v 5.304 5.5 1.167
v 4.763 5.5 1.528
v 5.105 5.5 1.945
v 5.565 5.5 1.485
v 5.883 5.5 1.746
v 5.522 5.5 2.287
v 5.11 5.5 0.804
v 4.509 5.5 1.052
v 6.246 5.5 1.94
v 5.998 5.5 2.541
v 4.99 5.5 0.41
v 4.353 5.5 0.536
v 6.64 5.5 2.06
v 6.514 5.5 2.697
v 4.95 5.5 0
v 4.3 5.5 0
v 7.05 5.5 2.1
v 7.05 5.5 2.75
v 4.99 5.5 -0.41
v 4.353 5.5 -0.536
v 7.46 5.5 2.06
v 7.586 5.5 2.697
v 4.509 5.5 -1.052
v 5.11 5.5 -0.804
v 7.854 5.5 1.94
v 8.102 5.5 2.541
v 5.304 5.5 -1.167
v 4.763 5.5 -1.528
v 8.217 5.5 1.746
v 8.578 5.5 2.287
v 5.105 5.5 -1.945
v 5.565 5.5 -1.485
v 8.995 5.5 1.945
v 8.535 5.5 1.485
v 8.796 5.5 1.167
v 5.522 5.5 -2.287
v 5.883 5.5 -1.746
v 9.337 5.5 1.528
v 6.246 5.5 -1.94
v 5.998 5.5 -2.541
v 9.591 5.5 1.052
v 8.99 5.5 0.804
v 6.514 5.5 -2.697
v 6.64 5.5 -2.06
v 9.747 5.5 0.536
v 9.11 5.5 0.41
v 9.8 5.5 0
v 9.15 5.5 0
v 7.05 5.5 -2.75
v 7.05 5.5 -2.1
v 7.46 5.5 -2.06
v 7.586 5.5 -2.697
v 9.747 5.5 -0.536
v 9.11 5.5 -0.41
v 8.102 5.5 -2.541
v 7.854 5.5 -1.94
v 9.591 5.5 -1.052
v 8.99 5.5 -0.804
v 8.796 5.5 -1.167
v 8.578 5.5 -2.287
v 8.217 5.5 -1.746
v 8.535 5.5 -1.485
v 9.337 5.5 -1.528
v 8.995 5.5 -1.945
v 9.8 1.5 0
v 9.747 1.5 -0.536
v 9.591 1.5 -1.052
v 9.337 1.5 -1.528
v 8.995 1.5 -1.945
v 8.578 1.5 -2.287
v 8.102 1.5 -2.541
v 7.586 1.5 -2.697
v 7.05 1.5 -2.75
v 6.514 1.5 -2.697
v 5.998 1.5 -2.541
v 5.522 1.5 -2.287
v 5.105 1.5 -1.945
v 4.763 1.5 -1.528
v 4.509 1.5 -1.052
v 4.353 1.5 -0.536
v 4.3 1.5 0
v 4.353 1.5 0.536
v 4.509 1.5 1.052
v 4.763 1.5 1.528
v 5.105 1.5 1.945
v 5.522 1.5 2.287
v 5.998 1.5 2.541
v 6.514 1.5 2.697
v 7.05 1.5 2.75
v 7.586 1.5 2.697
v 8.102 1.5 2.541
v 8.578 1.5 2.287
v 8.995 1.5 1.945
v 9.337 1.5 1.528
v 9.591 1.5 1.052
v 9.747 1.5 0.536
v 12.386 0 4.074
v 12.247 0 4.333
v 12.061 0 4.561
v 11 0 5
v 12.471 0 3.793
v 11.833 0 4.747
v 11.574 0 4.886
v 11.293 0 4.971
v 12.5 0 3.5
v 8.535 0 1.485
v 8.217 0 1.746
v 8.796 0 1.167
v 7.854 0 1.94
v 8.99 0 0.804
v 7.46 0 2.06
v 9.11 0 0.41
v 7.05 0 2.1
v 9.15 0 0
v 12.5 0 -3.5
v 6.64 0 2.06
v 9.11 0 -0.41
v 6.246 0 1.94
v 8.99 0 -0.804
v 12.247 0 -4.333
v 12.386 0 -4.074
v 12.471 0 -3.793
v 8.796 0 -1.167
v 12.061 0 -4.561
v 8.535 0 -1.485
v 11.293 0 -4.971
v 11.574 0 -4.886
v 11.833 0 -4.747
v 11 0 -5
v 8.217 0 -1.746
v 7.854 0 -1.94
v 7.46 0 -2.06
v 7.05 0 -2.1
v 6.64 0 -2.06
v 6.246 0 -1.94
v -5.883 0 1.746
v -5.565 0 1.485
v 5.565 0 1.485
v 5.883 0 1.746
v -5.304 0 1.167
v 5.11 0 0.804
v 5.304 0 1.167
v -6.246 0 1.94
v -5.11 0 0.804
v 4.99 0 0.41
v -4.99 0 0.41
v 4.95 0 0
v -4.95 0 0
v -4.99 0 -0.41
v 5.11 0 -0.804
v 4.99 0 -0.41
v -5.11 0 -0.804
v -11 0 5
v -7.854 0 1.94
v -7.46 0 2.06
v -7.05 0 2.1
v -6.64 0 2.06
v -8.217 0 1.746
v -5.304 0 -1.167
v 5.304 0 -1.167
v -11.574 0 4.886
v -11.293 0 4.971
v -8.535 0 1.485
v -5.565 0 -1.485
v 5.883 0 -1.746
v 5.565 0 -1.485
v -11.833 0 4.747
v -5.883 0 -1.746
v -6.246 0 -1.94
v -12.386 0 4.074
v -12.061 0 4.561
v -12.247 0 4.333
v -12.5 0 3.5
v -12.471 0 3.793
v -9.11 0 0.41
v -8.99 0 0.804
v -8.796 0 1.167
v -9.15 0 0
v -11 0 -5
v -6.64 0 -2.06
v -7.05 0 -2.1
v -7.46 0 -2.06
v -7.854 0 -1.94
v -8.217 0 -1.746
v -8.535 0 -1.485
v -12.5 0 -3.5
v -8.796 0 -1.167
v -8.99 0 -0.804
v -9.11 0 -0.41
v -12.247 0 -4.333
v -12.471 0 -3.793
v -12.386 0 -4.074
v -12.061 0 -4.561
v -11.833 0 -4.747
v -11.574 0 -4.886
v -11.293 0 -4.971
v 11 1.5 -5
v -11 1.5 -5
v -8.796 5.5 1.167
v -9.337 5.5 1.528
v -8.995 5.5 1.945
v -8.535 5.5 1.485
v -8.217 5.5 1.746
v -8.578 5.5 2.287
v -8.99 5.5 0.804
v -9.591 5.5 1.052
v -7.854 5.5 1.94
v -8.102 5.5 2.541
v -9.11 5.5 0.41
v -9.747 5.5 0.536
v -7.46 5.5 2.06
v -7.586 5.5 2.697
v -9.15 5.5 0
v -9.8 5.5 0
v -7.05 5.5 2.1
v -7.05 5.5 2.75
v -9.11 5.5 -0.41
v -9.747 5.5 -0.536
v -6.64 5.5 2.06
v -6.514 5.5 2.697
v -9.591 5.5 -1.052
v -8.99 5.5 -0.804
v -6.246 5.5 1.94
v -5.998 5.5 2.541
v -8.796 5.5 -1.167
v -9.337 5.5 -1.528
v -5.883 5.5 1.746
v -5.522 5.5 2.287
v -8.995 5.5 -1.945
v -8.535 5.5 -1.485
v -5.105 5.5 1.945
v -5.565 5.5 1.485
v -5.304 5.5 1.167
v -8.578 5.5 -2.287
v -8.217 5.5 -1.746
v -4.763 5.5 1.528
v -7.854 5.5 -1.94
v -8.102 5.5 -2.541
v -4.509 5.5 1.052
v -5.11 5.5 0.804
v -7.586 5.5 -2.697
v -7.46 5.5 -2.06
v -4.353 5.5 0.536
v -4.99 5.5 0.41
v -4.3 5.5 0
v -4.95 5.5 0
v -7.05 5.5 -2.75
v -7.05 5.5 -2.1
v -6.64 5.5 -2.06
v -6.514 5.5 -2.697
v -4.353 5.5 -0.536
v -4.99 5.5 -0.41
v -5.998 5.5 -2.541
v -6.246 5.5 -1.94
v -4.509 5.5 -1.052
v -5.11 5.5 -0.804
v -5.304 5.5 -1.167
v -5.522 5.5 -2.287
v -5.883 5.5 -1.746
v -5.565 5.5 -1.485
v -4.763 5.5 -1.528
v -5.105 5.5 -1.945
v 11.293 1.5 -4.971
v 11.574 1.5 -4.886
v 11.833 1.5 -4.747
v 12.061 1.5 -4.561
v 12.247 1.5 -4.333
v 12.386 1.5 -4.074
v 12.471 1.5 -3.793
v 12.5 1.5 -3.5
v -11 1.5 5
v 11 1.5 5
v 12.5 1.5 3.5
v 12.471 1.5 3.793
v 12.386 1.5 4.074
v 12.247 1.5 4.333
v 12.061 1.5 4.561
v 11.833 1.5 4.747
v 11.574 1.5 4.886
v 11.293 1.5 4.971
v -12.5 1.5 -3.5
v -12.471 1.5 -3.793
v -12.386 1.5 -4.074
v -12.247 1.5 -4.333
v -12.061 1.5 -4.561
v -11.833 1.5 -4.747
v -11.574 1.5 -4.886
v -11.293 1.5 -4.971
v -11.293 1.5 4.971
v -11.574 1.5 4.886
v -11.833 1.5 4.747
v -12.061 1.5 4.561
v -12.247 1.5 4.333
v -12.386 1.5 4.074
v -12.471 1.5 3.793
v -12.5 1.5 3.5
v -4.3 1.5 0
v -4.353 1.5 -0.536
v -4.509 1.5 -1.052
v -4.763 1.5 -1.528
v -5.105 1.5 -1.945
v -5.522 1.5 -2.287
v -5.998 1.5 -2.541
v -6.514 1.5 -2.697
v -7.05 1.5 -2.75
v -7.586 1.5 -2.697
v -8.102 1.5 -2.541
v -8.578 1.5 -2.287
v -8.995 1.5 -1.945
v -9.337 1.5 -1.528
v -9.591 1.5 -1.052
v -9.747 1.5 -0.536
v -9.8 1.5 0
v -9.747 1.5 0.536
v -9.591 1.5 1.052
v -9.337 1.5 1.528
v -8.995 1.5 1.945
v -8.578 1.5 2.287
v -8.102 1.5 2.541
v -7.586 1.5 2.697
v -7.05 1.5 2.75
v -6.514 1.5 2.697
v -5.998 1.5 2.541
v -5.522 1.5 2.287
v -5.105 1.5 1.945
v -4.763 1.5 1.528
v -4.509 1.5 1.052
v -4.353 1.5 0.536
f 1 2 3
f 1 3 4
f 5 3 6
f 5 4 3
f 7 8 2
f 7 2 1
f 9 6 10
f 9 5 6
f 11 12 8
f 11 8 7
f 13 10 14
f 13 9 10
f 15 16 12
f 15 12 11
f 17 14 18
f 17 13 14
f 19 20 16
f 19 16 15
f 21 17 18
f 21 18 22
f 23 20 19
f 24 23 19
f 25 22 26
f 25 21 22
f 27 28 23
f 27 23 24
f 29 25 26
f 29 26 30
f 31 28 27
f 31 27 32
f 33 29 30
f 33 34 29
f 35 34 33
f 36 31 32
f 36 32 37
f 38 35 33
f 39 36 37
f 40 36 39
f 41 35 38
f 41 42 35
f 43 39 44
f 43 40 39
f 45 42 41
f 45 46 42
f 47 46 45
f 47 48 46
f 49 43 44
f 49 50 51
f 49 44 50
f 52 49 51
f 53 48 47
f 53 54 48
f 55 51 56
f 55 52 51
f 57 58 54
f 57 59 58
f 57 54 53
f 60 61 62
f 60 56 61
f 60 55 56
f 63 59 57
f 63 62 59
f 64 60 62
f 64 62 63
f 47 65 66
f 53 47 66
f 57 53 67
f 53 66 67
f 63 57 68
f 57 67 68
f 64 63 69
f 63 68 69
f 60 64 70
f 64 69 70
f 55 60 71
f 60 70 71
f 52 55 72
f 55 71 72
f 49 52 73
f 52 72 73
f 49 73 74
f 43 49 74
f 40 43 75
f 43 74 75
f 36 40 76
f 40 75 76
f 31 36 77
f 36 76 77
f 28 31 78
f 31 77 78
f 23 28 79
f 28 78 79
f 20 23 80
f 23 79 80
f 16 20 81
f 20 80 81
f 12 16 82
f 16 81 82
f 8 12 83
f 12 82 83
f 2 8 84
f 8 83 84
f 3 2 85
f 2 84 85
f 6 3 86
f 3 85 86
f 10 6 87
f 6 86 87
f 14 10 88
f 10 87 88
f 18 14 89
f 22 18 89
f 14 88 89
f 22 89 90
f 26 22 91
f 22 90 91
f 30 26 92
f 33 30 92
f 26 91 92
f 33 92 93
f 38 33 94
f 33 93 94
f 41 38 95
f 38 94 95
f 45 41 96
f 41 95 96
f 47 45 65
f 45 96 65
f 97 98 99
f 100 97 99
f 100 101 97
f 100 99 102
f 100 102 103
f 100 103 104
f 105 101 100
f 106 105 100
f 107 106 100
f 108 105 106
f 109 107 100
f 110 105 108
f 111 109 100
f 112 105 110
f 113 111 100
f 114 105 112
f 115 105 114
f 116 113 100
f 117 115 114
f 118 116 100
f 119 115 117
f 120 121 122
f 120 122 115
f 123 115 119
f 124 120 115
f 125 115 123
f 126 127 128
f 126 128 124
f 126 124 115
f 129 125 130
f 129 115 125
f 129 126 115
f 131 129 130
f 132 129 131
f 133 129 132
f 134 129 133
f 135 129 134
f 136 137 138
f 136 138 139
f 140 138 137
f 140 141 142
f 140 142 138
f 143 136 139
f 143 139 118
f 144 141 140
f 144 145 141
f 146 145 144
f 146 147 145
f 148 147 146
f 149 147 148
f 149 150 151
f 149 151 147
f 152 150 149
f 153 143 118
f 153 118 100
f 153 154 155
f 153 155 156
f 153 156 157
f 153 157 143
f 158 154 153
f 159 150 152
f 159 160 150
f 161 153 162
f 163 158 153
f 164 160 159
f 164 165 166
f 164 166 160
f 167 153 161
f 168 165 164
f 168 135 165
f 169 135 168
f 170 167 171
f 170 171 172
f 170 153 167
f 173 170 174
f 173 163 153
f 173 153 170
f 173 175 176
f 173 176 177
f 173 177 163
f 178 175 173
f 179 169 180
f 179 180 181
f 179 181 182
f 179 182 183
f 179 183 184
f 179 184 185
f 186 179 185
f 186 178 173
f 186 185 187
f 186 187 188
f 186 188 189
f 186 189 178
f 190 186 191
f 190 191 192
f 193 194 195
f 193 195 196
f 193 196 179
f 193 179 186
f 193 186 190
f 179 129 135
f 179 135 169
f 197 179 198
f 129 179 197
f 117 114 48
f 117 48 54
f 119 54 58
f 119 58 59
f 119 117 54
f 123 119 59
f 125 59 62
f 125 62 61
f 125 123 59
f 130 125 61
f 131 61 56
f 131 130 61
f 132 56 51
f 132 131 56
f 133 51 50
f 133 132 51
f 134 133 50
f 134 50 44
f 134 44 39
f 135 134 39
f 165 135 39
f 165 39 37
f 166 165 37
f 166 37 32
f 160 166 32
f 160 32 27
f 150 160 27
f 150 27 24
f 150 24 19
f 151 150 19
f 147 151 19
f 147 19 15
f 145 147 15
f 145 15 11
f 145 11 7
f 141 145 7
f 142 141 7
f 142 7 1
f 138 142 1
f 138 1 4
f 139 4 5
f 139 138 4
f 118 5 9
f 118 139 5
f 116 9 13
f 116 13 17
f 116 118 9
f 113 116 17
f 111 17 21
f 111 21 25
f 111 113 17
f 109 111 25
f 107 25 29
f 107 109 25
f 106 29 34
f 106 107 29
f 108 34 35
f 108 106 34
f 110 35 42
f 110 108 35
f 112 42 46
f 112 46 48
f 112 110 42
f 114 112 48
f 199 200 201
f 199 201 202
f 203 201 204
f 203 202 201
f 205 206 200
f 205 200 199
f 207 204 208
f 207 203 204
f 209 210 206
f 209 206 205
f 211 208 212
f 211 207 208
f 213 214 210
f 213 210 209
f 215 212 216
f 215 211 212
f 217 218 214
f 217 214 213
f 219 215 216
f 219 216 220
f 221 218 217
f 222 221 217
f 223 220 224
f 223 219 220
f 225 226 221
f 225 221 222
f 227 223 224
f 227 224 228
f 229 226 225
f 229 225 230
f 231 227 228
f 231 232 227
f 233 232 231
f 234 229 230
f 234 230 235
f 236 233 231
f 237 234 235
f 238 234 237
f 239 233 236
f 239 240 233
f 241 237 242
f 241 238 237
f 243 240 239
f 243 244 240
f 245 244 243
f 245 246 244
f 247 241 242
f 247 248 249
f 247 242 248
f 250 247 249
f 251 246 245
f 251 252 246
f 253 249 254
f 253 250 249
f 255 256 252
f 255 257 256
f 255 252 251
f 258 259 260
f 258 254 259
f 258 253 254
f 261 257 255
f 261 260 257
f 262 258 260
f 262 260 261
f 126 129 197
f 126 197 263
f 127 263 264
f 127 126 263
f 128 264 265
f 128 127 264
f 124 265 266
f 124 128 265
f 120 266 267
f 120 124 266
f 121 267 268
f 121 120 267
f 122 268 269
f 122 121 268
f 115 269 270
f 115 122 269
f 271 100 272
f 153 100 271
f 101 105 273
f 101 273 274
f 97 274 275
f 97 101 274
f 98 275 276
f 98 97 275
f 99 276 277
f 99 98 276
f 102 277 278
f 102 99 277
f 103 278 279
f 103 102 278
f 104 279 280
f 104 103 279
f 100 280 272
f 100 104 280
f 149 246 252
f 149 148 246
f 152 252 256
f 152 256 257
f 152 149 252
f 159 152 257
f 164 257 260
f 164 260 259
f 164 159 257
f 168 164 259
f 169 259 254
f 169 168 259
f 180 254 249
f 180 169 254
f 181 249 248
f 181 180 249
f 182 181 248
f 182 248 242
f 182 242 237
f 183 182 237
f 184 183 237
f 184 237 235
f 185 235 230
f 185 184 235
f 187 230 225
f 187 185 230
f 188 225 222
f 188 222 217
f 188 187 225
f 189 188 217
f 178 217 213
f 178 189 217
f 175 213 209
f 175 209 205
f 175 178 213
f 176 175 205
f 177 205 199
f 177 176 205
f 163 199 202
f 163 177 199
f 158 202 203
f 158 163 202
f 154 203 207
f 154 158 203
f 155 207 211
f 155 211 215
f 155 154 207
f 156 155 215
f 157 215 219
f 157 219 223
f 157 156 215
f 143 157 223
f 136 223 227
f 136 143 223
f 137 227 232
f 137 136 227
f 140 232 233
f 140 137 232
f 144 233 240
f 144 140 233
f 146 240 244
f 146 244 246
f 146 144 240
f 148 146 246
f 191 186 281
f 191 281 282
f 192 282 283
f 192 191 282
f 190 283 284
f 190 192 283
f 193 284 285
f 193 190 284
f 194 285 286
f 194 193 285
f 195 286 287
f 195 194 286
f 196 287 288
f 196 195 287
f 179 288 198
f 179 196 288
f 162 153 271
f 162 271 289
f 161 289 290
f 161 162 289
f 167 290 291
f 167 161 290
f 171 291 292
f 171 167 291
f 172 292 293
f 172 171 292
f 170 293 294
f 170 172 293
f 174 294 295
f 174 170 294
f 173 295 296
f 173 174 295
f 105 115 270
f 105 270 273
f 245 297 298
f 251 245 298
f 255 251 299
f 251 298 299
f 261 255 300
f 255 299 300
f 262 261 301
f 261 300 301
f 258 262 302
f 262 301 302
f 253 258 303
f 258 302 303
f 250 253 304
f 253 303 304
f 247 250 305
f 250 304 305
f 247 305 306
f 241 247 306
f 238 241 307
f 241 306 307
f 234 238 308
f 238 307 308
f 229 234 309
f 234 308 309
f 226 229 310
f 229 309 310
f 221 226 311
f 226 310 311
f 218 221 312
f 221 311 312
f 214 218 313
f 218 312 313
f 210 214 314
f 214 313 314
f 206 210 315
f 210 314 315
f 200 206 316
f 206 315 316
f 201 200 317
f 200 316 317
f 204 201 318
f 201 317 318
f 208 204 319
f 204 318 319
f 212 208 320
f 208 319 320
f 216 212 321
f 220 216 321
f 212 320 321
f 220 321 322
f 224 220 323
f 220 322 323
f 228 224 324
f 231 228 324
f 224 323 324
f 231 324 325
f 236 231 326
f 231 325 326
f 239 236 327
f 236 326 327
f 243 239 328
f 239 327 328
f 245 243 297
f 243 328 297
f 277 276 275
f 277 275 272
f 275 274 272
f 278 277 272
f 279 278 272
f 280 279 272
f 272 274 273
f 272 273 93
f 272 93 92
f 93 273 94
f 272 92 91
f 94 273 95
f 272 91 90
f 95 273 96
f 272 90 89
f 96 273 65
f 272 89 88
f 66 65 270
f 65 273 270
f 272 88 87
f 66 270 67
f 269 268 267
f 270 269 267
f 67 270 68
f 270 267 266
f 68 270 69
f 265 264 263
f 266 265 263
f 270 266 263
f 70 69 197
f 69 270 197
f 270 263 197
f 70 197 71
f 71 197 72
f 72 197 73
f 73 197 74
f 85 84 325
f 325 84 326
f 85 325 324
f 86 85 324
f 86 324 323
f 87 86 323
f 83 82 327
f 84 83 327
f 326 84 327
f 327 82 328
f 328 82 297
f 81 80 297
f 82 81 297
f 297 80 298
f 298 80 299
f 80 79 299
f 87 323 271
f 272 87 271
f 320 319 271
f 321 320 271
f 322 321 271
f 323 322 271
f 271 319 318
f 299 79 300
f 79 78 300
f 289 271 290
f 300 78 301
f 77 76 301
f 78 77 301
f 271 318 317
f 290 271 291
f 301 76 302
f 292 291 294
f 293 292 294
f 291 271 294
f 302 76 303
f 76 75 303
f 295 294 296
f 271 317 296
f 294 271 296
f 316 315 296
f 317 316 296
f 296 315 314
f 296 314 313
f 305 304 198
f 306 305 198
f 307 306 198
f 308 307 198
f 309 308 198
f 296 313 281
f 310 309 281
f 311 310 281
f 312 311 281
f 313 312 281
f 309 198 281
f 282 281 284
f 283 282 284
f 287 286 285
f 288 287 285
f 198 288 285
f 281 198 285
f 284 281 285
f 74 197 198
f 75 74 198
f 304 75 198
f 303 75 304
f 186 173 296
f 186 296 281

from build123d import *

# Parameters (mm, degrees)
SKETCH1_R           = 2.1
BOSS_EXTRUDE1_DEPTH = 1.5
SKETCH3_R           = 2.75
SKETCH3_R_2         = 2.1
BOSS_EXTRUDE2_DEPTH = 4


with BuildPart() as part:
    # Sketch1 → Boss-Extrude1 (new body)
    with BuildSketch(Plane(origin=(0, 0, 0), x_dir=(1, 0, 0), z_dir=(0, 1, 0))):
        with BuildLine():
            Line((-11, 5), (11, 5))
            ThreePointArc((11, 5), (12.060660172, 4.560660172), (12.5, 3.5))
            Line((12.5, 3.5), (12.5, -3.5))
            ThreePointArc((12.5, -3.5), (12.060660172, -4.560660172), (11, -5))
            Line((11, -5), (-11, -5))
            ThreePointArc((-11, -5), (-12.060660172, -4.560660172), (-12.5, -3.5))
            Line((-12.5, -3.5), (-12.5, 3.5))
            ThreePointArc((-12.5, 3.5), (-12.060660172, 4.560660172), (-11, 5))
        make_face()
        with Locations((-7.05, 0)):
            Circle(SKETCH1_R, mode=Mode.SUBTRACT)
        with Locations((7.05, 0)):
            Circle(SKETCH1_R, mode=Mode.SUBTRACT)
    extrude(amount=BOSS_EXTRUDE1_DEPTH)

    # Sketch3 → Boss-Extrude2 (add)
    with BuildSketch(Plane(origin=(0, 1.5, 0), x_dir=(1, 0, 0), z_dir=(0, 1, 0))):
        with Locations((-7.05, 0)):
            Circle(SKETCH3_R)
        with Locations((-7.05, 0)):
            Circle(SKETCH3_R_2, mode=Mode.SUBTRACT)
        with Locations((7.05, 0)):
            Circle(SKETCH3_R)
        with Locations((7.05, 0)):
            Circle(SKETCH3_R_2, mode=Mode.SUBTRACT)
    extrude(amount=BOSS_EXTRUDE2_DEPTH)


solid = part.part
